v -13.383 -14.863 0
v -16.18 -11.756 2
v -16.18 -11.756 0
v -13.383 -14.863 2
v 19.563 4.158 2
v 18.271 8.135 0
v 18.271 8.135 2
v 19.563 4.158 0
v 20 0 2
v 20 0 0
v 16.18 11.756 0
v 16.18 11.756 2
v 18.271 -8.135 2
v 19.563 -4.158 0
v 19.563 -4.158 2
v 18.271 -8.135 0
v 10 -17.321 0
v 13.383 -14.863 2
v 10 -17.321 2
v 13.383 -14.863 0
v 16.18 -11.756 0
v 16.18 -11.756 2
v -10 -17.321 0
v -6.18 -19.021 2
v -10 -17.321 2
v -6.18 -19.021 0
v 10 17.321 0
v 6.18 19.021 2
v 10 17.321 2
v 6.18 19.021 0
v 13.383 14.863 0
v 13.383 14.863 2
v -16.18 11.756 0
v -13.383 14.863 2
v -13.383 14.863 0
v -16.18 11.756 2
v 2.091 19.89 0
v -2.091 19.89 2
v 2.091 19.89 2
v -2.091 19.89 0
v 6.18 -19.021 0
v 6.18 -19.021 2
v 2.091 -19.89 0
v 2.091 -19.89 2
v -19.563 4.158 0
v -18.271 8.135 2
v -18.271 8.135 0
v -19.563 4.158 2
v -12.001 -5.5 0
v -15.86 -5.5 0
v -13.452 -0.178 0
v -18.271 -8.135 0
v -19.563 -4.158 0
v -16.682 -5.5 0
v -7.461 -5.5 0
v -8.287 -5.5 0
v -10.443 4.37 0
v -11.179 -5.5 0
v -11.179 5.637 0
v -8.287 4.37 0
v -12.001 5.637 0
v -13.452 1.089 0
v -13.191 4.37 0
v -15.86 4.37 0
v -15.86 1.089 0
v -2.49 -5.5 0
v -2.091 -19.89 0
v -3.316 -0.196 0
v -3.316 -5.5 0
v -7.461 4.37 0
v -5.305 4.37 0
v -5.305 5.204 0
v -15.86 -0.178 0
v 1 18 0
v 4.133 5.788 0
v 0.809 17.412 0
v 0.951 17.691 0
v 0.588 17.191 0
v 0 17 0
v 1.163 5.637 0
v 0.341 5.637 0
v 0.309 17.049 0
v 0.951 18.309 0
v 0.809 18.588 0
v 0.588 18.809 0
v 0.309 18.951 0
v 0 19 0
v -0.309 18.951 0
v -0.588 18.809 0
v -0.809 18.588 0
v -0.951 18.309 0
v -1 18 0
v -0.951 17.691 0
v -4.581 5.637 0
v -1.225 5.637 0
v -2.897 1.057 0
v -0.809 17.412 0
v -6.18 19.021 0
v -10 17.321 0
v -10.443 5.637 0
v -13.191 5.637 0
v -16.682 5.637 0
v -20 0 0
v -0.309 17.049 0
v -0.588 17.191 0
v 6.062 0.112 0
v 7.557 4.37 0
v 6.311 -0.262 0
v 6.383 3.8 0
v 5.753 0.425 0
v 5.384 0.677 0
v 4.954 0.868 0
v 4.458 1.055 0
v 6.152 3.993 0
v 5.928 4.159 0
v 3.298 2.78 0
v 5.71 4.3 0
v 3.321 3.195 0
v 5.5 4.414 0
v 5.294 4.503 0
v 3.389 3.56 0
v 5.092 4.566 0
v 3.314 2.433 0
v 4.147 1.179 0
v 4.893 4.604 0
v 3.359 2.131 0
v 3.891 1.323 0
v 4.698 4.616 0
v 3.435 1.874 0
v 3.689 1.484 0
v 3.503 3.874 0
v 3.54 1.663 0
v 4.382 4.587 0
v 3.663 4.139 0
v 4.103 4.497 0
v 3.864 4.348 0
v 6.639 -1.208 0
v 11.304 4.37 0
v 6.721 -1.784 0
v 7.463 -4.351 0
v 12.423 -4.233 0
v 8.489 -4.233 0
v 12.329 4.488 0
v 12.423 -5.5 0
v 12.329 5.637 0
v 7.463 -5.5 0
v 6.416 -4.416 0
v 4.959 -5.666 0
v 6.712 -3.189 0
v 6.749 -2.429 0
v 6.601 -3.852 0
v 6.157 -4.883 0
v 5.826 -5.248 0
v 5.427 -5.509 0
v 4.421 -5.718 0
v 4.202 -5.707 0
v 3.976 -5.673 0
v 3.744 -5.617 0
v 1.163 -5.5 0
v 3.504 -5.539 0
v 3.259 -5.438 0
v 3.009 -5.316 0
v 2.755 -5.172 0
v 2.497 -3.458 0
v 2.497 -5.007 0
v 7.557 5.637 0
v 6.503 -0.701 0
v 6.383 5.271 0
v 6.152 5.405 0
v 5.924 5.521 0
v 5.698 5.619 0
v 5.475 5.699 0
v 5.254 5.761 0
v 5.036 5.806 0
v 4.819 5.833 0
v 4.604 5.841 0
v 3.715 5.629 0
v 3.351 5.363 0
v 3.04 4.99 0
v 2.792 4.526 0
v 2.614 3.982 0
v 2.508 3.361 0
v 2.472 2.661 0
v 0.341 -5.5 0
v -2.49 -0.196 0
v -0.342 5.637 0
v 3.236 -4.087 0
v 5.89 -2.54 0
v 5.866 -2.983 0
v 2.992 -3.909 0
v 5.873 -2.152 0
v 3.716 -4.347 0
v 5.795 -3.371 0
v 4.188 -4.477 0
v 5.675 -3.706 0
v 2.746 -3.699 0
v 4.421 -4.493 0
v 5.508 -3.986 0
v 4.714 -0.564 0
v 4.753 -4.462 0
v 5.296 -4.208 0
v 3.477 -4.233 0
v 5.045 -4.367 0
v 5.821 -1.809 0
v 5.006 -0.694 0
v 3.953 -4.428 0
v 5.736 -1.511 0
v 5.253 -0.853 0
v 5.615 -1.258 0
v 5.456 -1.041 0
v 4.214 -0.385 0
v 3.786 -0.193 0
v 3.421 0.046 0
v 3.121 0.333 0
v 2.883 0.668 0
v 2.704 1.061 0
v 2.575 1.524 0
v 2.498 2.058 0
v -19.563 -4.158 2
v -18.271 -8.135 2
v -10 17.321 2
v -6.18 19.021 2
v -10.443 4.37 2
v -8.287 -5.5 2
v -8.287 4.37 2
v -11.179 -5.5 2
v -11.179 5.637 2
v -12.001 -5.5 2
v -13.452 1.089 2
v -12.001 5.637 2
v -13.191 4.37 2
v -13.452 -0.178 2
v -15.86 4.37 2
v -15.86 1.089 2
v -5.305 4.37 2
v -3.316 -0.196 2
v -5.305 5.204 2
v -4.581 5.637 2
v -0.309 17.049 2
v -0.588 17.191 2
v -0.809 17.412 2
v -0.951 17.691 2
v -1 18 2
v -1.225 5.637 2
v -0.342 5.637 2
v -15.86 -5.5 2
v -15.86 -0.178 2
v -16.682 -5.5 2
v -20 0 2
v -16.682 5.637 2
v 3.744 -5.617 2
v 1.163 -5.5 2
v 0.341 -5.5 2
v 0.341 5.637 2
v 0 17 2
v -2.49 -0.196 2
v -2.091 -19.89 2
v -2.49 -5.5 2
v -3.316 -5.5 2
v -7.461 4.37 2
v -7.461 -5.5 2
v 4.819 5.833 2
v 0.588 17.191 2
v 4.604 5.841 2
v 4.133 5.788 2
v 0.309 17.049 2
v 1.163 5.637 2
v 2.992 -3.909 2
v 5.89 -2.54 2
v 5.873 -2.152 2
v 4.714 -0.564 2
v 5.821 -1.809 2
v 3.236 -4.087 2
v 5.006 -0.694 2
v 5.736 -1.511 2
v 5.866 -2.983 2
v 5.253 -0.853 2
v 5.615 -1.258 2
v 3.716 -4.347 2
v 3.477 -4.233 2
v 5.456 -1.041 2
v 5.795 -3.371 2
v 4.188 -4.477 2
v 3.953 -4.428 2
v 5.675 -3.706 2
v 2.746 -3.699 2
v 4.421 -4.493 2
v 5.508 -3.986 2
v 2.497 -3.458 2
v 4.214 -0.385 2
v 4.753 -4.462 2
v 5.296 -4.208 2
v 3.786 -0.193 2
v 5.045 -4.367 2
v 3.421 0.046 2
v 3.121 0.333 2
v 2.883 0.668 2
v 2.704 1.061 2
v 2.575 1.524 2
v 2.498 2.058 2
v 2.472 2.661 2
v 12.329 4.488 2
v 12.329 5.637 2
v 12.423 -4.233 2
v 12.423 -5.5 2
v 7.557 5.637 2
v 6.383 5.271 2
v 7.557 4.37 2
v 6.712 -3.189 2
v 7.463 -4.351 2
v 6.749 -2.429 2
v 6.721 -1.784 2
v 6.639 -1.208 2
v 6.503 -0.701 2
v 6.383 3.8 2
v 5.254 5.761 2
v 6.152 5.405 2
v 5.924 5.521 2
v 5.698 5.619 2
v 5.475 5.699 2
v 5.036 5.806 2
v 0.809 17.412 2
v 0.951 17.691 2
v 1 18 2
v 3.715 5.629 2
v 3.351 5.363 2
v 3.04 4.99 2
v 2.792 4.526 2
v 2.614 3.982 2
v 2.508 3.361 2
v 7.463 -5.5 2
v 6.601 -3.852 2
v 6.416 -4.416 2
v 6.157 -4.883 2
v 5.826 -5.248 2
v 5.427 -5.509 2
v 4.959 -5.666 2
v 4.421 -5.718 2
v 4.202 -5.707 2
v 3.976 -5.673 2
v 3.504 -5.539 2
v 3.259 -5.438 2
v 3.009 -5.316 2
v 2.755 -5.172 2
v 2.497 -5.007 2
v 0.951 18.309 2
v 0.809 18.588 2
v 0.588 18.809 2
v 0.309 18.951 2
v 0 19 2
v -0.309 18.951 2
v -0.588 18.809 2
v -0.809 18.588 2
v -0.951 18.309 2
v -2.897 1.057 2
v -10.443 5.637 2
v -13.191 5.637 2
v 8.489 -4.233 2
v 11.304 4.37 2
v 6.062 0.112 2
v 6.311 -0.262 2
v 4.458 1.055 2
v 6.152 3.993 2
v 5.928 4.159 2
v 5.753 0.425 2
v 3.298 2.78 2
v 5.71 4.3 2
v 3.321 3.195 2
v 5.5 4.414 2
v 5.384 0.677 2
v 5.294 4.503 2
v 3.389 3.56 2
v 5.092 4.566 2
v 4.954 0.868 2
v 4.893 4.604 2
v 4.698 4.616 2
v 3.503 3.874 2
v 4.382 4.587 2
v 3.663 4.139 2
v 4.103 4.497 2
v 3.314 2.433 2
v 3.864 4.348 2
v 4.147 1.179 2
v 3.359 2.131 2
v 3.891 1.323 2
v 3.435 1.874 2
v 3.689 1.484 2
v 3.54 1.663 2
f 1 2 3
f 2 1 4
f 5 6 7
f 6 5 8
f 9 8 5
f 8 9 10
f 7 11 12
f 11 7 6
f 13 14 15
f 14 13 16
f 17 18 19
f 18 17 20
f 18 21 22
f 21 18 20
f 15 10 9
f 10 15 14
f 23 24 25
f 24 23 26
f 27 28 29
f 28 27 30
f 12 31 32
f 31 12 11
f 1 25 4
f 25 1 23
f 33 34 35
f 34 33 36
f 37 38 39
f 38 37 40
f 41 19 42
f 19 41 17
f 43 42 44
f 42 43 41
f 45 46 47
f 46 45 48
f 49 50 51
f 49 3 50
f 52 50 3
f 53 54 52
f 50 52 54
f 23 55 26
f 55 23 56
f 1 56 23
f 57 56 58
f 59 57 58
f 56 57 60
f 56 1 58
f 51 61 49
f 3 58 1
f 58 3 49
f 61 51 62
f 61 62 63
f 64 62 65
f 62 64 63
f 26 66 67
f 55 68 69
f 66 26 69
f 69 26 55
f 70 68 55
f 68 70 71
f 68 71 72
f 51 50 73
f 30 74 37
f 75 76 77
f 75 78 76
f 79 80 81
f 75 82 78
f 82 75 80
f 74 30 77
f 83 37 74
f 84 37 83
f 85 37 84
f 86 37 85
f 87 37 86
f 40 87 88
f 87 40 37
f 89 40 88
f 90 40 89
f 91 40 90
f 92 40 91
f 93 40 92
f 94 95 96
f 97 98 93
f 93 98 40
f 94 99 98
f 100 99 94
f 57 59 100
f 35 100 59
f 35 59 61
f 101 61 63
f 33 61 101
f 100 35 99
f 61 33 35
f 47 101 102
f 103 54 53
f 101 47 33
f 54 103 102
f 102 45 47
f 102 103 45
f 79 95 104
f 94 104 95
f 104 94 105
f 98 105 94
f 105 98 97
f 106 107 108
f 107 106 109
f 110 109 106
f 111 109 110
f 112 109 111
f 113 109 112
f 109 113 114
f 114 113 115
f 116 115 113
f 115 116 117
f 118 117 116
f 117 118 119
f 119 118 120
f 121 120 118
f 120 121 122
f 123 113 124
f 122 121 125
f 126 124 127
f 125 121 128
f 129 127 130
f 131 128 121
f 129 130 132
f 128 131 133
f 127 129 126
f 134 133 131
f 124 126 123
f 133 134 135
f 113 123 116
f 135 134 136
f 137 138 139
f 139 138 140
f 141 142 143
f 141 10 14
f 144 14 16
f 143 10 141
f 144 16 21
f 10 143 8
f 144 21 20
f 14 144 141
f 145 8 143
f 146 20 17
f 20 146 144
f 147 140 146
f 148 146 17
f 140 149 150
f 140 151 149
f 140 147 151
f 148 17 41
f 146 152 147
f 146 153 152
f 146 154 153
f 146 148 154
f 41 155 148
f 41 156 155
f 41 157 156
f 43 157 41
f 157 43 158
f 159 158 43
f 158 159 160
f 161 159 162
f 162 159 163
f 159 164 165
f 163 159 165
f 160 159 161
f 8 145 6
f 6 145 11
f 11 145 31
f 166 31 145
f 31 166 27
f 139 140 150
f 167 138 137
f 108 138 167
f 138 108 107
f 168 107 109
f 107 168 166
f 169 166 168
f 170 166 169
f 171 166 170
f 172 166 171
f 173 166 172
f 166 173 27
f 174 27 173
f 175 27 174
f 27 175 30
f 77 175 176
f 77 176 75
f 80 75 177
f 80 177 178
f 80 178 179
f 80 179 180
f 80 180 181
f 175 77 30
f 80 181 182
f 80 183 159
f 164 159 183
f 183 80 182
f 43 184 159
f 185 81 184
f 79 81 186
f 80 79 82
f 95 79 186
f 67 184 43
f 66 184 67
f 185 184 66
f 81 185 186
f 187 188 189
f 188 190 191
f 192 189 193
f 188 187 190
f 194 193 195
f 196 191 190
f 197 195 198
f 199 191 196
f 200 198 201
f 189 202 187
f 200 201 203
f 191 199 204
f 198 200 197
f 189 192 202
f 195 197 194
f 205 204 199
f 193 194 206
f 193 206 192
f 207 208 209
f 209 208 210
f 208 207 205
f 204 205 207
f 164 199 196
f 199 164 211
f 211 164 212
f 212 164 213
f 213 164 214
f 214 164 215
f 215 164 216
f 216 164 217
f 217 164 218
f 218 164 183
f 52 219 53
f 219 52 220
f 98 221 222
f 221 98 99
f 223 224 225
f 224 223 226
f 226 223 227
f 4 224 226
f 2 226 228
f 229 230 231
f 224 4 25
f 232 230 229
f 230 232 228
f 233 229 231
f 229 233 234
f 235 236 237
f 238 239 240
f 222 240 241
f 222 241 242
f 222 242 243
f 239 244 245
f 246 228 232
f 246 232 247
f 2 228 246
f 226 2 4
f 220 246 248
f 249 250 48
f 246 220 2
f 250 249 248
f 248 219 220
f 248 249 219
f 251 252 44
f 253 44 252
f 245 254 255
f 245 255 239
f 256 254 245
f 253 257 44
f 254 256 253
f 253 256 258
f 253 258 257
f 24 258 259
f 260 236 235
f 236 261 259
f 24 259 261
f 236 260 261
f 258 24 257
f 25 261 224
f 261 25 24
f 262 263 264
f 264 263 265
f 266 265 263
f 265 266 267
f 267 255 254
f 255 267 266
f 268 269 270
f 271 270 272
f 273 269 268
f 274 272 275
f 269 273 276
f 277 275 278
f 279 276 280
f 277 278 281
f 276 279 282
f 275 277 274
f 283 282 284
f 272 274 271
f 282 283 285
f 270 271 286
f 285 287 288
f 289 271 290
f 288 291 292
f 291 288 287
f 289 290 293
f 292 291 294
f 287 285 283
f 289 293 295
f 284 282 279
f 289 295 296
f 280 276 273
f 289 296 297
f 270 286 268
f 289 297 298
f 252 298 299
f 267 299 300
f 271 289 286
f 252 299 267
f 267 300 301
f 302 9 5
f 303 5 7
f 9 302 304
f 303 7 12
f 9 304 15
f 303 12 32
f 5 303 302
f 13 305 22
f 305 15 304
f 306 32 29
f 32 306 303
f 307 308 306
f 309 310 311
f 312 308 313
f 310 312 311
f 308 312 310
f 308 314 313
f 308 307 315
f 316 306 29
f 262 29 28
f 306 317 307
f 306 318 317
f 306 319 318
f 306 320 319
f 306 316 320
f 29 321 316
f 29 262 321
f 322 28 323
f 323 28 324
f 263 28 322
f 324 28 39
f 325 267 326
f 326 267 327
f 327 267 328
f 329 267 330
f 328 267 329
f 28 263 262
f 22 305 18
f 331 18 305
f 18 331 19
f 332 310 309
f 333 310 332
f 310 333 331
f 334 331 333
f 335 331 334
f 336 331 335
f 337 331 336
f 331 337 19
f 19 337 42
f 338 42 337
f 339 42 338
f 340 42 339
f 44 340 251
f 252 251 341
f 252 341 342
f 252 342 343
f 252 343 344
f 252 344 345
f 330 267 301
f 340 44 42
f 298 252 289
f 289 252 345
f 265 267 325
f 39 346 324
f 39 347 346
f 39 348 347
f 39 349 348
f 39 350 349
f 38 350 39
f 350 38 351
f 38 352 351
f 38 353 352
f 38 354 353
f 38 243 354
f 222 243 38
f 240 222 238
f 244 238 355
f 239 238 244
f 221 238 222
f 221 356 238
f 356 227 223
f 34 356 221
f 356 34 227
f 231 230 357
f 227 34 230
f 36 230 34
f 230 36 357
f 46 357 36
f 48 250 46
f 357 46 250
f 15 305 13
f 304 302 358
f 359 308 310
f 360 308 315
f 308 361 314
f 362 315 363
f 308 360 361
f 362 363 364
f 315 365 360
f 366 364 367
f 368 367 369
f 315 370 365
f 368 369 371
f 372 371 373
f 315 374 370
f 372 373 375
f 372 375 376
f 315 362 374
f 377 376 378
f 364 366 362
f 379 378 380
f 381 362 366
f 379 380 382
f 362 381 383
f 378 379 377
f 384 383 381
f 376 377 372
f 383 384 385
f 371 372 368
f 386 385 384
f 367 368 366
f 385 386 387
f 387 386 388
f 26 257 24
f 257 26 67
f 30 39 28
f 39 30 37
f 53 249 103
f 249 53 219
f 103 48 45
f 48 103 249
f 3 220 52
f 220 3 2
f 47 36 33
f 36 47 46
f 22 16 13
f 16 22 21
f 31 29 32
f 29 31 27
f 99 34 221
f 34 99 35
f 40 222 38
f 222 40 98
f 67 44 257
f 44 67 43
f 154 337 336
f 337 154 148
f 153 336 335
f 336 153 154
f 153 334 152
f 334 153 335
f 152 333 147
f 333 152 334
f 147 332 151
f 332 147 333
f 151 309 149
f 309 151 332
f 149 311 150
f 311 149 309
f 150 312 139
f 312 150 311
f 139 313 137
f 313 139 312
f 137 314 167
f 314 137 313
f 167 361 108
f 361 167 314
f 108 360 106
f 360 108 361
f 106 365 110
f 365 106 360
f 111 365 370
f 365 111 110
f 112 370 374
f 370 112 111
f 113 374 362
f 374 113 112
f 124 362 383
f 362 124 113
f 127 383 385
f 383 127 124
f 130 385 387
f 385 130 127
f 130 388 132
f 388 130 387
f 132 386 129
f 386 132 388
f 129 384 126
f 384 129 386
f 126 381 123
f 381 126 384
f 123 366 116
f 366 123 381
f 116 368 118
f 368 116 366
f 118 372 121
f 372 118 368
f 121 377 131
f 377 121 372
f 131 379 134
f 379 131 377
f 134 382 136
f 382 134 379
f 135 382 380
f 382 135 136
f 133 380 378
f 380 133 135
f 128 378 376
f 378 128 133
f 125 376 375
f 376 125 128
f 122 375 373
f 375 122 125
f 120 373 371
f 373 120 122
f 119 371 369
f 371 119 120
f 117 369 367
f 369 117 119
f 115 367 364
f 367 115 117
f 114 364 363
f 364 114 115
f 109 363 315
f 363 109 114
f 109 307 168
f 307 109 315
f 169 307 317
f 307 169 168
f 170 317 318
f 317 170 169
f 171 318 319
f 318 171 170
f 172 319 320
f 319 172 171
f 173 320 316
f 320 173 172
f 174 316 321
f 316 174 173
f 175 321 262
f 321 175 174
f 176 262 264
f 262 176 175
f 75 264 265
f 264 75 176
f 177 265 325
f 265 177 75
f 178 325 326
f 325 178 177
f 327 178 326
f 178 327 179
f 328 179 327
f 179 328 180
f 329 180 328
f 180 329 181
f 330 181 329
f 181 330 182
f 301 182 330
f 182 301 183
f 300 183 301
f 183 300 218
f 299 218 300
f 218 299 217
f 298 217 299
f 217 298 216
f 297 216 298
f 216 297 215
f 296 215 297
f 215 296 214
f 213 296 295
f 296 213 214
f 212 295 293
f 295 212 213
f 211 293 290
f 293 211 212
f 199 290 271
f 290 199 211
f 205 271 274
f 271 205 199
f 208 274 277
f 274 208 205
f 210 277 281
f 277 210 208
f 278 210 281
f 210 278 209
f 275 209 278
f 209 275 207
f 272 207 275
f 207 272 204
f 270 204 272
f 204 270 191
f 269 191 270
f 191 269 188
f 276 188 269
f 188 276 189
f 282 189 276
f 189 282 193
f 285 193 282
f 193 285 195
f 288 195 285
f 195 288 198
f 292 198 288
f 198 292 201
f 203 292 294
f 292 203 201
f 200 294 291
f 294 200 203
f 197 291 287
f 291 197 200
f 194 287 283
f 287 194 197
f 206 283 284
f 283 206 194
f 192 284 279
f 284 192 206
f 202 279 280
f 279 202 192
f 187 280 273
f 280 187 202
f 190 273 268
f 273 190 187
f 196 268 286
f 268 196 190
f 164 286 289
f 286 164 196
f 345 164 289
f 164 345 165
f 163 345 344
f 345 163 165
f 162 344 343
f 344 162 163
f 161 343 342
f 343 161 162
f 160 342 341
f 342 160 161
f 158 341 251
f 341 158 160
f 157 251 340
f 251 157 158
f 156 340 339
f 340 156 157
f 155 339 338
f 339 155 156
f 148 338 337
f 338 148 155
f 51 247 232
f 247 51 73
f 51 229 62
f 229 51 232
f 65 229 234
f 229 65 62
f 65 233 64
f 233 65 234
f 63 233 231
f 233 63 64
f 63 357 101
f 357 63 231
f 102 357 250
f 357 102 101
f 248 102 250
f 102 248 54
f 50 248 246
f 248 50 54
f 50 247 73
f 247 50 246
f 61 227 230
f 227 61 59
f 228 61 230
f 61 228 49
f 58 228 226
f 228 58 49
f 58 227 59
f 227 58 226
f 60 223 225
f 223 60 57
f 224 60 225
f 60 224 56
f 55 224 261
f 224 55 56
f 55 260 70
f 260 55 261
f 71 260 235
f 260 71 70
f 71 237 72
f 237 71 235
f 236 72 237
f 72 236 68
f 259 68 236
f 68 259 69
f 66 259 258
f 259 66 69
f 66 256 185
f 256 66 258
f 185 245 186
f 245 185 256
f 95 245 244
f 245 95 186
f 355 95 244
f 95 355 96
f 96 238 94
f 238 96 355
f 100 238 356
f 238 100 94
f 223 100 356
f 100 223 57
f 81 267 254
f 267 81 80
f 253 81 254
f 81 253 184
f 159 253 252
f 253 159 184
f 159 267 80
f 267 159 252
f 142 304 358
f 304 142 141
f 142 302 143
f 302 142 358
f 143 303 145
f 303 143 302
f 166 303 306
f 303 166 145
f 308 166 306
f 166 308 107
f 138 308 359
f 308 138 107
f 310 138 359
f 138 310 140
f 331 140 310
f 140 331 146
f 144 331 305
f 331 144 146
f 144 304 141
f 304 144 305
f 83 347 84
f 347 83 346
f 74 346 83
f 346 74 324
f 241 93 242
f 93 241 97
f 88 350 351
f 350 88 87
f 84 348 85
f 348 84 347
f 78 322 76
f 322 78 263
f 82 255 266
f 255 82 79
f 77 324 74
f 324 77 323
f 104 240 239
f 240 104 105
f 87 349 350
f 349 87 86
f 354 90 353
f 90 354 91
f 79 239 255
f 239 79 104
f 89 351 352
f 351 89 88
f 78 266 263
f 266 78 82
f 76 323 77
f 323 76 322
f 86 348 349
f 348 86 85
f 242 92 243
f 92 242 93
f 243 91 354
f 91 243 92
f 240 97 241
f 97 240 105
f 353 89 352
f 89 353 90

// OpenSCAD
color("orange")
difference() {
    cylinder(2,20,20);

    translate([-17.5,-5.5,-1])
    linear_extrude(height = 5) 
    scale([0.6,1.1,0.6])
    text("FITYISZ",font="Deja Vu Sans:style=Bold Oblique");
    
    translate([0,18,-1])    
    cylinder(5,1,1,$fn=20);
}
